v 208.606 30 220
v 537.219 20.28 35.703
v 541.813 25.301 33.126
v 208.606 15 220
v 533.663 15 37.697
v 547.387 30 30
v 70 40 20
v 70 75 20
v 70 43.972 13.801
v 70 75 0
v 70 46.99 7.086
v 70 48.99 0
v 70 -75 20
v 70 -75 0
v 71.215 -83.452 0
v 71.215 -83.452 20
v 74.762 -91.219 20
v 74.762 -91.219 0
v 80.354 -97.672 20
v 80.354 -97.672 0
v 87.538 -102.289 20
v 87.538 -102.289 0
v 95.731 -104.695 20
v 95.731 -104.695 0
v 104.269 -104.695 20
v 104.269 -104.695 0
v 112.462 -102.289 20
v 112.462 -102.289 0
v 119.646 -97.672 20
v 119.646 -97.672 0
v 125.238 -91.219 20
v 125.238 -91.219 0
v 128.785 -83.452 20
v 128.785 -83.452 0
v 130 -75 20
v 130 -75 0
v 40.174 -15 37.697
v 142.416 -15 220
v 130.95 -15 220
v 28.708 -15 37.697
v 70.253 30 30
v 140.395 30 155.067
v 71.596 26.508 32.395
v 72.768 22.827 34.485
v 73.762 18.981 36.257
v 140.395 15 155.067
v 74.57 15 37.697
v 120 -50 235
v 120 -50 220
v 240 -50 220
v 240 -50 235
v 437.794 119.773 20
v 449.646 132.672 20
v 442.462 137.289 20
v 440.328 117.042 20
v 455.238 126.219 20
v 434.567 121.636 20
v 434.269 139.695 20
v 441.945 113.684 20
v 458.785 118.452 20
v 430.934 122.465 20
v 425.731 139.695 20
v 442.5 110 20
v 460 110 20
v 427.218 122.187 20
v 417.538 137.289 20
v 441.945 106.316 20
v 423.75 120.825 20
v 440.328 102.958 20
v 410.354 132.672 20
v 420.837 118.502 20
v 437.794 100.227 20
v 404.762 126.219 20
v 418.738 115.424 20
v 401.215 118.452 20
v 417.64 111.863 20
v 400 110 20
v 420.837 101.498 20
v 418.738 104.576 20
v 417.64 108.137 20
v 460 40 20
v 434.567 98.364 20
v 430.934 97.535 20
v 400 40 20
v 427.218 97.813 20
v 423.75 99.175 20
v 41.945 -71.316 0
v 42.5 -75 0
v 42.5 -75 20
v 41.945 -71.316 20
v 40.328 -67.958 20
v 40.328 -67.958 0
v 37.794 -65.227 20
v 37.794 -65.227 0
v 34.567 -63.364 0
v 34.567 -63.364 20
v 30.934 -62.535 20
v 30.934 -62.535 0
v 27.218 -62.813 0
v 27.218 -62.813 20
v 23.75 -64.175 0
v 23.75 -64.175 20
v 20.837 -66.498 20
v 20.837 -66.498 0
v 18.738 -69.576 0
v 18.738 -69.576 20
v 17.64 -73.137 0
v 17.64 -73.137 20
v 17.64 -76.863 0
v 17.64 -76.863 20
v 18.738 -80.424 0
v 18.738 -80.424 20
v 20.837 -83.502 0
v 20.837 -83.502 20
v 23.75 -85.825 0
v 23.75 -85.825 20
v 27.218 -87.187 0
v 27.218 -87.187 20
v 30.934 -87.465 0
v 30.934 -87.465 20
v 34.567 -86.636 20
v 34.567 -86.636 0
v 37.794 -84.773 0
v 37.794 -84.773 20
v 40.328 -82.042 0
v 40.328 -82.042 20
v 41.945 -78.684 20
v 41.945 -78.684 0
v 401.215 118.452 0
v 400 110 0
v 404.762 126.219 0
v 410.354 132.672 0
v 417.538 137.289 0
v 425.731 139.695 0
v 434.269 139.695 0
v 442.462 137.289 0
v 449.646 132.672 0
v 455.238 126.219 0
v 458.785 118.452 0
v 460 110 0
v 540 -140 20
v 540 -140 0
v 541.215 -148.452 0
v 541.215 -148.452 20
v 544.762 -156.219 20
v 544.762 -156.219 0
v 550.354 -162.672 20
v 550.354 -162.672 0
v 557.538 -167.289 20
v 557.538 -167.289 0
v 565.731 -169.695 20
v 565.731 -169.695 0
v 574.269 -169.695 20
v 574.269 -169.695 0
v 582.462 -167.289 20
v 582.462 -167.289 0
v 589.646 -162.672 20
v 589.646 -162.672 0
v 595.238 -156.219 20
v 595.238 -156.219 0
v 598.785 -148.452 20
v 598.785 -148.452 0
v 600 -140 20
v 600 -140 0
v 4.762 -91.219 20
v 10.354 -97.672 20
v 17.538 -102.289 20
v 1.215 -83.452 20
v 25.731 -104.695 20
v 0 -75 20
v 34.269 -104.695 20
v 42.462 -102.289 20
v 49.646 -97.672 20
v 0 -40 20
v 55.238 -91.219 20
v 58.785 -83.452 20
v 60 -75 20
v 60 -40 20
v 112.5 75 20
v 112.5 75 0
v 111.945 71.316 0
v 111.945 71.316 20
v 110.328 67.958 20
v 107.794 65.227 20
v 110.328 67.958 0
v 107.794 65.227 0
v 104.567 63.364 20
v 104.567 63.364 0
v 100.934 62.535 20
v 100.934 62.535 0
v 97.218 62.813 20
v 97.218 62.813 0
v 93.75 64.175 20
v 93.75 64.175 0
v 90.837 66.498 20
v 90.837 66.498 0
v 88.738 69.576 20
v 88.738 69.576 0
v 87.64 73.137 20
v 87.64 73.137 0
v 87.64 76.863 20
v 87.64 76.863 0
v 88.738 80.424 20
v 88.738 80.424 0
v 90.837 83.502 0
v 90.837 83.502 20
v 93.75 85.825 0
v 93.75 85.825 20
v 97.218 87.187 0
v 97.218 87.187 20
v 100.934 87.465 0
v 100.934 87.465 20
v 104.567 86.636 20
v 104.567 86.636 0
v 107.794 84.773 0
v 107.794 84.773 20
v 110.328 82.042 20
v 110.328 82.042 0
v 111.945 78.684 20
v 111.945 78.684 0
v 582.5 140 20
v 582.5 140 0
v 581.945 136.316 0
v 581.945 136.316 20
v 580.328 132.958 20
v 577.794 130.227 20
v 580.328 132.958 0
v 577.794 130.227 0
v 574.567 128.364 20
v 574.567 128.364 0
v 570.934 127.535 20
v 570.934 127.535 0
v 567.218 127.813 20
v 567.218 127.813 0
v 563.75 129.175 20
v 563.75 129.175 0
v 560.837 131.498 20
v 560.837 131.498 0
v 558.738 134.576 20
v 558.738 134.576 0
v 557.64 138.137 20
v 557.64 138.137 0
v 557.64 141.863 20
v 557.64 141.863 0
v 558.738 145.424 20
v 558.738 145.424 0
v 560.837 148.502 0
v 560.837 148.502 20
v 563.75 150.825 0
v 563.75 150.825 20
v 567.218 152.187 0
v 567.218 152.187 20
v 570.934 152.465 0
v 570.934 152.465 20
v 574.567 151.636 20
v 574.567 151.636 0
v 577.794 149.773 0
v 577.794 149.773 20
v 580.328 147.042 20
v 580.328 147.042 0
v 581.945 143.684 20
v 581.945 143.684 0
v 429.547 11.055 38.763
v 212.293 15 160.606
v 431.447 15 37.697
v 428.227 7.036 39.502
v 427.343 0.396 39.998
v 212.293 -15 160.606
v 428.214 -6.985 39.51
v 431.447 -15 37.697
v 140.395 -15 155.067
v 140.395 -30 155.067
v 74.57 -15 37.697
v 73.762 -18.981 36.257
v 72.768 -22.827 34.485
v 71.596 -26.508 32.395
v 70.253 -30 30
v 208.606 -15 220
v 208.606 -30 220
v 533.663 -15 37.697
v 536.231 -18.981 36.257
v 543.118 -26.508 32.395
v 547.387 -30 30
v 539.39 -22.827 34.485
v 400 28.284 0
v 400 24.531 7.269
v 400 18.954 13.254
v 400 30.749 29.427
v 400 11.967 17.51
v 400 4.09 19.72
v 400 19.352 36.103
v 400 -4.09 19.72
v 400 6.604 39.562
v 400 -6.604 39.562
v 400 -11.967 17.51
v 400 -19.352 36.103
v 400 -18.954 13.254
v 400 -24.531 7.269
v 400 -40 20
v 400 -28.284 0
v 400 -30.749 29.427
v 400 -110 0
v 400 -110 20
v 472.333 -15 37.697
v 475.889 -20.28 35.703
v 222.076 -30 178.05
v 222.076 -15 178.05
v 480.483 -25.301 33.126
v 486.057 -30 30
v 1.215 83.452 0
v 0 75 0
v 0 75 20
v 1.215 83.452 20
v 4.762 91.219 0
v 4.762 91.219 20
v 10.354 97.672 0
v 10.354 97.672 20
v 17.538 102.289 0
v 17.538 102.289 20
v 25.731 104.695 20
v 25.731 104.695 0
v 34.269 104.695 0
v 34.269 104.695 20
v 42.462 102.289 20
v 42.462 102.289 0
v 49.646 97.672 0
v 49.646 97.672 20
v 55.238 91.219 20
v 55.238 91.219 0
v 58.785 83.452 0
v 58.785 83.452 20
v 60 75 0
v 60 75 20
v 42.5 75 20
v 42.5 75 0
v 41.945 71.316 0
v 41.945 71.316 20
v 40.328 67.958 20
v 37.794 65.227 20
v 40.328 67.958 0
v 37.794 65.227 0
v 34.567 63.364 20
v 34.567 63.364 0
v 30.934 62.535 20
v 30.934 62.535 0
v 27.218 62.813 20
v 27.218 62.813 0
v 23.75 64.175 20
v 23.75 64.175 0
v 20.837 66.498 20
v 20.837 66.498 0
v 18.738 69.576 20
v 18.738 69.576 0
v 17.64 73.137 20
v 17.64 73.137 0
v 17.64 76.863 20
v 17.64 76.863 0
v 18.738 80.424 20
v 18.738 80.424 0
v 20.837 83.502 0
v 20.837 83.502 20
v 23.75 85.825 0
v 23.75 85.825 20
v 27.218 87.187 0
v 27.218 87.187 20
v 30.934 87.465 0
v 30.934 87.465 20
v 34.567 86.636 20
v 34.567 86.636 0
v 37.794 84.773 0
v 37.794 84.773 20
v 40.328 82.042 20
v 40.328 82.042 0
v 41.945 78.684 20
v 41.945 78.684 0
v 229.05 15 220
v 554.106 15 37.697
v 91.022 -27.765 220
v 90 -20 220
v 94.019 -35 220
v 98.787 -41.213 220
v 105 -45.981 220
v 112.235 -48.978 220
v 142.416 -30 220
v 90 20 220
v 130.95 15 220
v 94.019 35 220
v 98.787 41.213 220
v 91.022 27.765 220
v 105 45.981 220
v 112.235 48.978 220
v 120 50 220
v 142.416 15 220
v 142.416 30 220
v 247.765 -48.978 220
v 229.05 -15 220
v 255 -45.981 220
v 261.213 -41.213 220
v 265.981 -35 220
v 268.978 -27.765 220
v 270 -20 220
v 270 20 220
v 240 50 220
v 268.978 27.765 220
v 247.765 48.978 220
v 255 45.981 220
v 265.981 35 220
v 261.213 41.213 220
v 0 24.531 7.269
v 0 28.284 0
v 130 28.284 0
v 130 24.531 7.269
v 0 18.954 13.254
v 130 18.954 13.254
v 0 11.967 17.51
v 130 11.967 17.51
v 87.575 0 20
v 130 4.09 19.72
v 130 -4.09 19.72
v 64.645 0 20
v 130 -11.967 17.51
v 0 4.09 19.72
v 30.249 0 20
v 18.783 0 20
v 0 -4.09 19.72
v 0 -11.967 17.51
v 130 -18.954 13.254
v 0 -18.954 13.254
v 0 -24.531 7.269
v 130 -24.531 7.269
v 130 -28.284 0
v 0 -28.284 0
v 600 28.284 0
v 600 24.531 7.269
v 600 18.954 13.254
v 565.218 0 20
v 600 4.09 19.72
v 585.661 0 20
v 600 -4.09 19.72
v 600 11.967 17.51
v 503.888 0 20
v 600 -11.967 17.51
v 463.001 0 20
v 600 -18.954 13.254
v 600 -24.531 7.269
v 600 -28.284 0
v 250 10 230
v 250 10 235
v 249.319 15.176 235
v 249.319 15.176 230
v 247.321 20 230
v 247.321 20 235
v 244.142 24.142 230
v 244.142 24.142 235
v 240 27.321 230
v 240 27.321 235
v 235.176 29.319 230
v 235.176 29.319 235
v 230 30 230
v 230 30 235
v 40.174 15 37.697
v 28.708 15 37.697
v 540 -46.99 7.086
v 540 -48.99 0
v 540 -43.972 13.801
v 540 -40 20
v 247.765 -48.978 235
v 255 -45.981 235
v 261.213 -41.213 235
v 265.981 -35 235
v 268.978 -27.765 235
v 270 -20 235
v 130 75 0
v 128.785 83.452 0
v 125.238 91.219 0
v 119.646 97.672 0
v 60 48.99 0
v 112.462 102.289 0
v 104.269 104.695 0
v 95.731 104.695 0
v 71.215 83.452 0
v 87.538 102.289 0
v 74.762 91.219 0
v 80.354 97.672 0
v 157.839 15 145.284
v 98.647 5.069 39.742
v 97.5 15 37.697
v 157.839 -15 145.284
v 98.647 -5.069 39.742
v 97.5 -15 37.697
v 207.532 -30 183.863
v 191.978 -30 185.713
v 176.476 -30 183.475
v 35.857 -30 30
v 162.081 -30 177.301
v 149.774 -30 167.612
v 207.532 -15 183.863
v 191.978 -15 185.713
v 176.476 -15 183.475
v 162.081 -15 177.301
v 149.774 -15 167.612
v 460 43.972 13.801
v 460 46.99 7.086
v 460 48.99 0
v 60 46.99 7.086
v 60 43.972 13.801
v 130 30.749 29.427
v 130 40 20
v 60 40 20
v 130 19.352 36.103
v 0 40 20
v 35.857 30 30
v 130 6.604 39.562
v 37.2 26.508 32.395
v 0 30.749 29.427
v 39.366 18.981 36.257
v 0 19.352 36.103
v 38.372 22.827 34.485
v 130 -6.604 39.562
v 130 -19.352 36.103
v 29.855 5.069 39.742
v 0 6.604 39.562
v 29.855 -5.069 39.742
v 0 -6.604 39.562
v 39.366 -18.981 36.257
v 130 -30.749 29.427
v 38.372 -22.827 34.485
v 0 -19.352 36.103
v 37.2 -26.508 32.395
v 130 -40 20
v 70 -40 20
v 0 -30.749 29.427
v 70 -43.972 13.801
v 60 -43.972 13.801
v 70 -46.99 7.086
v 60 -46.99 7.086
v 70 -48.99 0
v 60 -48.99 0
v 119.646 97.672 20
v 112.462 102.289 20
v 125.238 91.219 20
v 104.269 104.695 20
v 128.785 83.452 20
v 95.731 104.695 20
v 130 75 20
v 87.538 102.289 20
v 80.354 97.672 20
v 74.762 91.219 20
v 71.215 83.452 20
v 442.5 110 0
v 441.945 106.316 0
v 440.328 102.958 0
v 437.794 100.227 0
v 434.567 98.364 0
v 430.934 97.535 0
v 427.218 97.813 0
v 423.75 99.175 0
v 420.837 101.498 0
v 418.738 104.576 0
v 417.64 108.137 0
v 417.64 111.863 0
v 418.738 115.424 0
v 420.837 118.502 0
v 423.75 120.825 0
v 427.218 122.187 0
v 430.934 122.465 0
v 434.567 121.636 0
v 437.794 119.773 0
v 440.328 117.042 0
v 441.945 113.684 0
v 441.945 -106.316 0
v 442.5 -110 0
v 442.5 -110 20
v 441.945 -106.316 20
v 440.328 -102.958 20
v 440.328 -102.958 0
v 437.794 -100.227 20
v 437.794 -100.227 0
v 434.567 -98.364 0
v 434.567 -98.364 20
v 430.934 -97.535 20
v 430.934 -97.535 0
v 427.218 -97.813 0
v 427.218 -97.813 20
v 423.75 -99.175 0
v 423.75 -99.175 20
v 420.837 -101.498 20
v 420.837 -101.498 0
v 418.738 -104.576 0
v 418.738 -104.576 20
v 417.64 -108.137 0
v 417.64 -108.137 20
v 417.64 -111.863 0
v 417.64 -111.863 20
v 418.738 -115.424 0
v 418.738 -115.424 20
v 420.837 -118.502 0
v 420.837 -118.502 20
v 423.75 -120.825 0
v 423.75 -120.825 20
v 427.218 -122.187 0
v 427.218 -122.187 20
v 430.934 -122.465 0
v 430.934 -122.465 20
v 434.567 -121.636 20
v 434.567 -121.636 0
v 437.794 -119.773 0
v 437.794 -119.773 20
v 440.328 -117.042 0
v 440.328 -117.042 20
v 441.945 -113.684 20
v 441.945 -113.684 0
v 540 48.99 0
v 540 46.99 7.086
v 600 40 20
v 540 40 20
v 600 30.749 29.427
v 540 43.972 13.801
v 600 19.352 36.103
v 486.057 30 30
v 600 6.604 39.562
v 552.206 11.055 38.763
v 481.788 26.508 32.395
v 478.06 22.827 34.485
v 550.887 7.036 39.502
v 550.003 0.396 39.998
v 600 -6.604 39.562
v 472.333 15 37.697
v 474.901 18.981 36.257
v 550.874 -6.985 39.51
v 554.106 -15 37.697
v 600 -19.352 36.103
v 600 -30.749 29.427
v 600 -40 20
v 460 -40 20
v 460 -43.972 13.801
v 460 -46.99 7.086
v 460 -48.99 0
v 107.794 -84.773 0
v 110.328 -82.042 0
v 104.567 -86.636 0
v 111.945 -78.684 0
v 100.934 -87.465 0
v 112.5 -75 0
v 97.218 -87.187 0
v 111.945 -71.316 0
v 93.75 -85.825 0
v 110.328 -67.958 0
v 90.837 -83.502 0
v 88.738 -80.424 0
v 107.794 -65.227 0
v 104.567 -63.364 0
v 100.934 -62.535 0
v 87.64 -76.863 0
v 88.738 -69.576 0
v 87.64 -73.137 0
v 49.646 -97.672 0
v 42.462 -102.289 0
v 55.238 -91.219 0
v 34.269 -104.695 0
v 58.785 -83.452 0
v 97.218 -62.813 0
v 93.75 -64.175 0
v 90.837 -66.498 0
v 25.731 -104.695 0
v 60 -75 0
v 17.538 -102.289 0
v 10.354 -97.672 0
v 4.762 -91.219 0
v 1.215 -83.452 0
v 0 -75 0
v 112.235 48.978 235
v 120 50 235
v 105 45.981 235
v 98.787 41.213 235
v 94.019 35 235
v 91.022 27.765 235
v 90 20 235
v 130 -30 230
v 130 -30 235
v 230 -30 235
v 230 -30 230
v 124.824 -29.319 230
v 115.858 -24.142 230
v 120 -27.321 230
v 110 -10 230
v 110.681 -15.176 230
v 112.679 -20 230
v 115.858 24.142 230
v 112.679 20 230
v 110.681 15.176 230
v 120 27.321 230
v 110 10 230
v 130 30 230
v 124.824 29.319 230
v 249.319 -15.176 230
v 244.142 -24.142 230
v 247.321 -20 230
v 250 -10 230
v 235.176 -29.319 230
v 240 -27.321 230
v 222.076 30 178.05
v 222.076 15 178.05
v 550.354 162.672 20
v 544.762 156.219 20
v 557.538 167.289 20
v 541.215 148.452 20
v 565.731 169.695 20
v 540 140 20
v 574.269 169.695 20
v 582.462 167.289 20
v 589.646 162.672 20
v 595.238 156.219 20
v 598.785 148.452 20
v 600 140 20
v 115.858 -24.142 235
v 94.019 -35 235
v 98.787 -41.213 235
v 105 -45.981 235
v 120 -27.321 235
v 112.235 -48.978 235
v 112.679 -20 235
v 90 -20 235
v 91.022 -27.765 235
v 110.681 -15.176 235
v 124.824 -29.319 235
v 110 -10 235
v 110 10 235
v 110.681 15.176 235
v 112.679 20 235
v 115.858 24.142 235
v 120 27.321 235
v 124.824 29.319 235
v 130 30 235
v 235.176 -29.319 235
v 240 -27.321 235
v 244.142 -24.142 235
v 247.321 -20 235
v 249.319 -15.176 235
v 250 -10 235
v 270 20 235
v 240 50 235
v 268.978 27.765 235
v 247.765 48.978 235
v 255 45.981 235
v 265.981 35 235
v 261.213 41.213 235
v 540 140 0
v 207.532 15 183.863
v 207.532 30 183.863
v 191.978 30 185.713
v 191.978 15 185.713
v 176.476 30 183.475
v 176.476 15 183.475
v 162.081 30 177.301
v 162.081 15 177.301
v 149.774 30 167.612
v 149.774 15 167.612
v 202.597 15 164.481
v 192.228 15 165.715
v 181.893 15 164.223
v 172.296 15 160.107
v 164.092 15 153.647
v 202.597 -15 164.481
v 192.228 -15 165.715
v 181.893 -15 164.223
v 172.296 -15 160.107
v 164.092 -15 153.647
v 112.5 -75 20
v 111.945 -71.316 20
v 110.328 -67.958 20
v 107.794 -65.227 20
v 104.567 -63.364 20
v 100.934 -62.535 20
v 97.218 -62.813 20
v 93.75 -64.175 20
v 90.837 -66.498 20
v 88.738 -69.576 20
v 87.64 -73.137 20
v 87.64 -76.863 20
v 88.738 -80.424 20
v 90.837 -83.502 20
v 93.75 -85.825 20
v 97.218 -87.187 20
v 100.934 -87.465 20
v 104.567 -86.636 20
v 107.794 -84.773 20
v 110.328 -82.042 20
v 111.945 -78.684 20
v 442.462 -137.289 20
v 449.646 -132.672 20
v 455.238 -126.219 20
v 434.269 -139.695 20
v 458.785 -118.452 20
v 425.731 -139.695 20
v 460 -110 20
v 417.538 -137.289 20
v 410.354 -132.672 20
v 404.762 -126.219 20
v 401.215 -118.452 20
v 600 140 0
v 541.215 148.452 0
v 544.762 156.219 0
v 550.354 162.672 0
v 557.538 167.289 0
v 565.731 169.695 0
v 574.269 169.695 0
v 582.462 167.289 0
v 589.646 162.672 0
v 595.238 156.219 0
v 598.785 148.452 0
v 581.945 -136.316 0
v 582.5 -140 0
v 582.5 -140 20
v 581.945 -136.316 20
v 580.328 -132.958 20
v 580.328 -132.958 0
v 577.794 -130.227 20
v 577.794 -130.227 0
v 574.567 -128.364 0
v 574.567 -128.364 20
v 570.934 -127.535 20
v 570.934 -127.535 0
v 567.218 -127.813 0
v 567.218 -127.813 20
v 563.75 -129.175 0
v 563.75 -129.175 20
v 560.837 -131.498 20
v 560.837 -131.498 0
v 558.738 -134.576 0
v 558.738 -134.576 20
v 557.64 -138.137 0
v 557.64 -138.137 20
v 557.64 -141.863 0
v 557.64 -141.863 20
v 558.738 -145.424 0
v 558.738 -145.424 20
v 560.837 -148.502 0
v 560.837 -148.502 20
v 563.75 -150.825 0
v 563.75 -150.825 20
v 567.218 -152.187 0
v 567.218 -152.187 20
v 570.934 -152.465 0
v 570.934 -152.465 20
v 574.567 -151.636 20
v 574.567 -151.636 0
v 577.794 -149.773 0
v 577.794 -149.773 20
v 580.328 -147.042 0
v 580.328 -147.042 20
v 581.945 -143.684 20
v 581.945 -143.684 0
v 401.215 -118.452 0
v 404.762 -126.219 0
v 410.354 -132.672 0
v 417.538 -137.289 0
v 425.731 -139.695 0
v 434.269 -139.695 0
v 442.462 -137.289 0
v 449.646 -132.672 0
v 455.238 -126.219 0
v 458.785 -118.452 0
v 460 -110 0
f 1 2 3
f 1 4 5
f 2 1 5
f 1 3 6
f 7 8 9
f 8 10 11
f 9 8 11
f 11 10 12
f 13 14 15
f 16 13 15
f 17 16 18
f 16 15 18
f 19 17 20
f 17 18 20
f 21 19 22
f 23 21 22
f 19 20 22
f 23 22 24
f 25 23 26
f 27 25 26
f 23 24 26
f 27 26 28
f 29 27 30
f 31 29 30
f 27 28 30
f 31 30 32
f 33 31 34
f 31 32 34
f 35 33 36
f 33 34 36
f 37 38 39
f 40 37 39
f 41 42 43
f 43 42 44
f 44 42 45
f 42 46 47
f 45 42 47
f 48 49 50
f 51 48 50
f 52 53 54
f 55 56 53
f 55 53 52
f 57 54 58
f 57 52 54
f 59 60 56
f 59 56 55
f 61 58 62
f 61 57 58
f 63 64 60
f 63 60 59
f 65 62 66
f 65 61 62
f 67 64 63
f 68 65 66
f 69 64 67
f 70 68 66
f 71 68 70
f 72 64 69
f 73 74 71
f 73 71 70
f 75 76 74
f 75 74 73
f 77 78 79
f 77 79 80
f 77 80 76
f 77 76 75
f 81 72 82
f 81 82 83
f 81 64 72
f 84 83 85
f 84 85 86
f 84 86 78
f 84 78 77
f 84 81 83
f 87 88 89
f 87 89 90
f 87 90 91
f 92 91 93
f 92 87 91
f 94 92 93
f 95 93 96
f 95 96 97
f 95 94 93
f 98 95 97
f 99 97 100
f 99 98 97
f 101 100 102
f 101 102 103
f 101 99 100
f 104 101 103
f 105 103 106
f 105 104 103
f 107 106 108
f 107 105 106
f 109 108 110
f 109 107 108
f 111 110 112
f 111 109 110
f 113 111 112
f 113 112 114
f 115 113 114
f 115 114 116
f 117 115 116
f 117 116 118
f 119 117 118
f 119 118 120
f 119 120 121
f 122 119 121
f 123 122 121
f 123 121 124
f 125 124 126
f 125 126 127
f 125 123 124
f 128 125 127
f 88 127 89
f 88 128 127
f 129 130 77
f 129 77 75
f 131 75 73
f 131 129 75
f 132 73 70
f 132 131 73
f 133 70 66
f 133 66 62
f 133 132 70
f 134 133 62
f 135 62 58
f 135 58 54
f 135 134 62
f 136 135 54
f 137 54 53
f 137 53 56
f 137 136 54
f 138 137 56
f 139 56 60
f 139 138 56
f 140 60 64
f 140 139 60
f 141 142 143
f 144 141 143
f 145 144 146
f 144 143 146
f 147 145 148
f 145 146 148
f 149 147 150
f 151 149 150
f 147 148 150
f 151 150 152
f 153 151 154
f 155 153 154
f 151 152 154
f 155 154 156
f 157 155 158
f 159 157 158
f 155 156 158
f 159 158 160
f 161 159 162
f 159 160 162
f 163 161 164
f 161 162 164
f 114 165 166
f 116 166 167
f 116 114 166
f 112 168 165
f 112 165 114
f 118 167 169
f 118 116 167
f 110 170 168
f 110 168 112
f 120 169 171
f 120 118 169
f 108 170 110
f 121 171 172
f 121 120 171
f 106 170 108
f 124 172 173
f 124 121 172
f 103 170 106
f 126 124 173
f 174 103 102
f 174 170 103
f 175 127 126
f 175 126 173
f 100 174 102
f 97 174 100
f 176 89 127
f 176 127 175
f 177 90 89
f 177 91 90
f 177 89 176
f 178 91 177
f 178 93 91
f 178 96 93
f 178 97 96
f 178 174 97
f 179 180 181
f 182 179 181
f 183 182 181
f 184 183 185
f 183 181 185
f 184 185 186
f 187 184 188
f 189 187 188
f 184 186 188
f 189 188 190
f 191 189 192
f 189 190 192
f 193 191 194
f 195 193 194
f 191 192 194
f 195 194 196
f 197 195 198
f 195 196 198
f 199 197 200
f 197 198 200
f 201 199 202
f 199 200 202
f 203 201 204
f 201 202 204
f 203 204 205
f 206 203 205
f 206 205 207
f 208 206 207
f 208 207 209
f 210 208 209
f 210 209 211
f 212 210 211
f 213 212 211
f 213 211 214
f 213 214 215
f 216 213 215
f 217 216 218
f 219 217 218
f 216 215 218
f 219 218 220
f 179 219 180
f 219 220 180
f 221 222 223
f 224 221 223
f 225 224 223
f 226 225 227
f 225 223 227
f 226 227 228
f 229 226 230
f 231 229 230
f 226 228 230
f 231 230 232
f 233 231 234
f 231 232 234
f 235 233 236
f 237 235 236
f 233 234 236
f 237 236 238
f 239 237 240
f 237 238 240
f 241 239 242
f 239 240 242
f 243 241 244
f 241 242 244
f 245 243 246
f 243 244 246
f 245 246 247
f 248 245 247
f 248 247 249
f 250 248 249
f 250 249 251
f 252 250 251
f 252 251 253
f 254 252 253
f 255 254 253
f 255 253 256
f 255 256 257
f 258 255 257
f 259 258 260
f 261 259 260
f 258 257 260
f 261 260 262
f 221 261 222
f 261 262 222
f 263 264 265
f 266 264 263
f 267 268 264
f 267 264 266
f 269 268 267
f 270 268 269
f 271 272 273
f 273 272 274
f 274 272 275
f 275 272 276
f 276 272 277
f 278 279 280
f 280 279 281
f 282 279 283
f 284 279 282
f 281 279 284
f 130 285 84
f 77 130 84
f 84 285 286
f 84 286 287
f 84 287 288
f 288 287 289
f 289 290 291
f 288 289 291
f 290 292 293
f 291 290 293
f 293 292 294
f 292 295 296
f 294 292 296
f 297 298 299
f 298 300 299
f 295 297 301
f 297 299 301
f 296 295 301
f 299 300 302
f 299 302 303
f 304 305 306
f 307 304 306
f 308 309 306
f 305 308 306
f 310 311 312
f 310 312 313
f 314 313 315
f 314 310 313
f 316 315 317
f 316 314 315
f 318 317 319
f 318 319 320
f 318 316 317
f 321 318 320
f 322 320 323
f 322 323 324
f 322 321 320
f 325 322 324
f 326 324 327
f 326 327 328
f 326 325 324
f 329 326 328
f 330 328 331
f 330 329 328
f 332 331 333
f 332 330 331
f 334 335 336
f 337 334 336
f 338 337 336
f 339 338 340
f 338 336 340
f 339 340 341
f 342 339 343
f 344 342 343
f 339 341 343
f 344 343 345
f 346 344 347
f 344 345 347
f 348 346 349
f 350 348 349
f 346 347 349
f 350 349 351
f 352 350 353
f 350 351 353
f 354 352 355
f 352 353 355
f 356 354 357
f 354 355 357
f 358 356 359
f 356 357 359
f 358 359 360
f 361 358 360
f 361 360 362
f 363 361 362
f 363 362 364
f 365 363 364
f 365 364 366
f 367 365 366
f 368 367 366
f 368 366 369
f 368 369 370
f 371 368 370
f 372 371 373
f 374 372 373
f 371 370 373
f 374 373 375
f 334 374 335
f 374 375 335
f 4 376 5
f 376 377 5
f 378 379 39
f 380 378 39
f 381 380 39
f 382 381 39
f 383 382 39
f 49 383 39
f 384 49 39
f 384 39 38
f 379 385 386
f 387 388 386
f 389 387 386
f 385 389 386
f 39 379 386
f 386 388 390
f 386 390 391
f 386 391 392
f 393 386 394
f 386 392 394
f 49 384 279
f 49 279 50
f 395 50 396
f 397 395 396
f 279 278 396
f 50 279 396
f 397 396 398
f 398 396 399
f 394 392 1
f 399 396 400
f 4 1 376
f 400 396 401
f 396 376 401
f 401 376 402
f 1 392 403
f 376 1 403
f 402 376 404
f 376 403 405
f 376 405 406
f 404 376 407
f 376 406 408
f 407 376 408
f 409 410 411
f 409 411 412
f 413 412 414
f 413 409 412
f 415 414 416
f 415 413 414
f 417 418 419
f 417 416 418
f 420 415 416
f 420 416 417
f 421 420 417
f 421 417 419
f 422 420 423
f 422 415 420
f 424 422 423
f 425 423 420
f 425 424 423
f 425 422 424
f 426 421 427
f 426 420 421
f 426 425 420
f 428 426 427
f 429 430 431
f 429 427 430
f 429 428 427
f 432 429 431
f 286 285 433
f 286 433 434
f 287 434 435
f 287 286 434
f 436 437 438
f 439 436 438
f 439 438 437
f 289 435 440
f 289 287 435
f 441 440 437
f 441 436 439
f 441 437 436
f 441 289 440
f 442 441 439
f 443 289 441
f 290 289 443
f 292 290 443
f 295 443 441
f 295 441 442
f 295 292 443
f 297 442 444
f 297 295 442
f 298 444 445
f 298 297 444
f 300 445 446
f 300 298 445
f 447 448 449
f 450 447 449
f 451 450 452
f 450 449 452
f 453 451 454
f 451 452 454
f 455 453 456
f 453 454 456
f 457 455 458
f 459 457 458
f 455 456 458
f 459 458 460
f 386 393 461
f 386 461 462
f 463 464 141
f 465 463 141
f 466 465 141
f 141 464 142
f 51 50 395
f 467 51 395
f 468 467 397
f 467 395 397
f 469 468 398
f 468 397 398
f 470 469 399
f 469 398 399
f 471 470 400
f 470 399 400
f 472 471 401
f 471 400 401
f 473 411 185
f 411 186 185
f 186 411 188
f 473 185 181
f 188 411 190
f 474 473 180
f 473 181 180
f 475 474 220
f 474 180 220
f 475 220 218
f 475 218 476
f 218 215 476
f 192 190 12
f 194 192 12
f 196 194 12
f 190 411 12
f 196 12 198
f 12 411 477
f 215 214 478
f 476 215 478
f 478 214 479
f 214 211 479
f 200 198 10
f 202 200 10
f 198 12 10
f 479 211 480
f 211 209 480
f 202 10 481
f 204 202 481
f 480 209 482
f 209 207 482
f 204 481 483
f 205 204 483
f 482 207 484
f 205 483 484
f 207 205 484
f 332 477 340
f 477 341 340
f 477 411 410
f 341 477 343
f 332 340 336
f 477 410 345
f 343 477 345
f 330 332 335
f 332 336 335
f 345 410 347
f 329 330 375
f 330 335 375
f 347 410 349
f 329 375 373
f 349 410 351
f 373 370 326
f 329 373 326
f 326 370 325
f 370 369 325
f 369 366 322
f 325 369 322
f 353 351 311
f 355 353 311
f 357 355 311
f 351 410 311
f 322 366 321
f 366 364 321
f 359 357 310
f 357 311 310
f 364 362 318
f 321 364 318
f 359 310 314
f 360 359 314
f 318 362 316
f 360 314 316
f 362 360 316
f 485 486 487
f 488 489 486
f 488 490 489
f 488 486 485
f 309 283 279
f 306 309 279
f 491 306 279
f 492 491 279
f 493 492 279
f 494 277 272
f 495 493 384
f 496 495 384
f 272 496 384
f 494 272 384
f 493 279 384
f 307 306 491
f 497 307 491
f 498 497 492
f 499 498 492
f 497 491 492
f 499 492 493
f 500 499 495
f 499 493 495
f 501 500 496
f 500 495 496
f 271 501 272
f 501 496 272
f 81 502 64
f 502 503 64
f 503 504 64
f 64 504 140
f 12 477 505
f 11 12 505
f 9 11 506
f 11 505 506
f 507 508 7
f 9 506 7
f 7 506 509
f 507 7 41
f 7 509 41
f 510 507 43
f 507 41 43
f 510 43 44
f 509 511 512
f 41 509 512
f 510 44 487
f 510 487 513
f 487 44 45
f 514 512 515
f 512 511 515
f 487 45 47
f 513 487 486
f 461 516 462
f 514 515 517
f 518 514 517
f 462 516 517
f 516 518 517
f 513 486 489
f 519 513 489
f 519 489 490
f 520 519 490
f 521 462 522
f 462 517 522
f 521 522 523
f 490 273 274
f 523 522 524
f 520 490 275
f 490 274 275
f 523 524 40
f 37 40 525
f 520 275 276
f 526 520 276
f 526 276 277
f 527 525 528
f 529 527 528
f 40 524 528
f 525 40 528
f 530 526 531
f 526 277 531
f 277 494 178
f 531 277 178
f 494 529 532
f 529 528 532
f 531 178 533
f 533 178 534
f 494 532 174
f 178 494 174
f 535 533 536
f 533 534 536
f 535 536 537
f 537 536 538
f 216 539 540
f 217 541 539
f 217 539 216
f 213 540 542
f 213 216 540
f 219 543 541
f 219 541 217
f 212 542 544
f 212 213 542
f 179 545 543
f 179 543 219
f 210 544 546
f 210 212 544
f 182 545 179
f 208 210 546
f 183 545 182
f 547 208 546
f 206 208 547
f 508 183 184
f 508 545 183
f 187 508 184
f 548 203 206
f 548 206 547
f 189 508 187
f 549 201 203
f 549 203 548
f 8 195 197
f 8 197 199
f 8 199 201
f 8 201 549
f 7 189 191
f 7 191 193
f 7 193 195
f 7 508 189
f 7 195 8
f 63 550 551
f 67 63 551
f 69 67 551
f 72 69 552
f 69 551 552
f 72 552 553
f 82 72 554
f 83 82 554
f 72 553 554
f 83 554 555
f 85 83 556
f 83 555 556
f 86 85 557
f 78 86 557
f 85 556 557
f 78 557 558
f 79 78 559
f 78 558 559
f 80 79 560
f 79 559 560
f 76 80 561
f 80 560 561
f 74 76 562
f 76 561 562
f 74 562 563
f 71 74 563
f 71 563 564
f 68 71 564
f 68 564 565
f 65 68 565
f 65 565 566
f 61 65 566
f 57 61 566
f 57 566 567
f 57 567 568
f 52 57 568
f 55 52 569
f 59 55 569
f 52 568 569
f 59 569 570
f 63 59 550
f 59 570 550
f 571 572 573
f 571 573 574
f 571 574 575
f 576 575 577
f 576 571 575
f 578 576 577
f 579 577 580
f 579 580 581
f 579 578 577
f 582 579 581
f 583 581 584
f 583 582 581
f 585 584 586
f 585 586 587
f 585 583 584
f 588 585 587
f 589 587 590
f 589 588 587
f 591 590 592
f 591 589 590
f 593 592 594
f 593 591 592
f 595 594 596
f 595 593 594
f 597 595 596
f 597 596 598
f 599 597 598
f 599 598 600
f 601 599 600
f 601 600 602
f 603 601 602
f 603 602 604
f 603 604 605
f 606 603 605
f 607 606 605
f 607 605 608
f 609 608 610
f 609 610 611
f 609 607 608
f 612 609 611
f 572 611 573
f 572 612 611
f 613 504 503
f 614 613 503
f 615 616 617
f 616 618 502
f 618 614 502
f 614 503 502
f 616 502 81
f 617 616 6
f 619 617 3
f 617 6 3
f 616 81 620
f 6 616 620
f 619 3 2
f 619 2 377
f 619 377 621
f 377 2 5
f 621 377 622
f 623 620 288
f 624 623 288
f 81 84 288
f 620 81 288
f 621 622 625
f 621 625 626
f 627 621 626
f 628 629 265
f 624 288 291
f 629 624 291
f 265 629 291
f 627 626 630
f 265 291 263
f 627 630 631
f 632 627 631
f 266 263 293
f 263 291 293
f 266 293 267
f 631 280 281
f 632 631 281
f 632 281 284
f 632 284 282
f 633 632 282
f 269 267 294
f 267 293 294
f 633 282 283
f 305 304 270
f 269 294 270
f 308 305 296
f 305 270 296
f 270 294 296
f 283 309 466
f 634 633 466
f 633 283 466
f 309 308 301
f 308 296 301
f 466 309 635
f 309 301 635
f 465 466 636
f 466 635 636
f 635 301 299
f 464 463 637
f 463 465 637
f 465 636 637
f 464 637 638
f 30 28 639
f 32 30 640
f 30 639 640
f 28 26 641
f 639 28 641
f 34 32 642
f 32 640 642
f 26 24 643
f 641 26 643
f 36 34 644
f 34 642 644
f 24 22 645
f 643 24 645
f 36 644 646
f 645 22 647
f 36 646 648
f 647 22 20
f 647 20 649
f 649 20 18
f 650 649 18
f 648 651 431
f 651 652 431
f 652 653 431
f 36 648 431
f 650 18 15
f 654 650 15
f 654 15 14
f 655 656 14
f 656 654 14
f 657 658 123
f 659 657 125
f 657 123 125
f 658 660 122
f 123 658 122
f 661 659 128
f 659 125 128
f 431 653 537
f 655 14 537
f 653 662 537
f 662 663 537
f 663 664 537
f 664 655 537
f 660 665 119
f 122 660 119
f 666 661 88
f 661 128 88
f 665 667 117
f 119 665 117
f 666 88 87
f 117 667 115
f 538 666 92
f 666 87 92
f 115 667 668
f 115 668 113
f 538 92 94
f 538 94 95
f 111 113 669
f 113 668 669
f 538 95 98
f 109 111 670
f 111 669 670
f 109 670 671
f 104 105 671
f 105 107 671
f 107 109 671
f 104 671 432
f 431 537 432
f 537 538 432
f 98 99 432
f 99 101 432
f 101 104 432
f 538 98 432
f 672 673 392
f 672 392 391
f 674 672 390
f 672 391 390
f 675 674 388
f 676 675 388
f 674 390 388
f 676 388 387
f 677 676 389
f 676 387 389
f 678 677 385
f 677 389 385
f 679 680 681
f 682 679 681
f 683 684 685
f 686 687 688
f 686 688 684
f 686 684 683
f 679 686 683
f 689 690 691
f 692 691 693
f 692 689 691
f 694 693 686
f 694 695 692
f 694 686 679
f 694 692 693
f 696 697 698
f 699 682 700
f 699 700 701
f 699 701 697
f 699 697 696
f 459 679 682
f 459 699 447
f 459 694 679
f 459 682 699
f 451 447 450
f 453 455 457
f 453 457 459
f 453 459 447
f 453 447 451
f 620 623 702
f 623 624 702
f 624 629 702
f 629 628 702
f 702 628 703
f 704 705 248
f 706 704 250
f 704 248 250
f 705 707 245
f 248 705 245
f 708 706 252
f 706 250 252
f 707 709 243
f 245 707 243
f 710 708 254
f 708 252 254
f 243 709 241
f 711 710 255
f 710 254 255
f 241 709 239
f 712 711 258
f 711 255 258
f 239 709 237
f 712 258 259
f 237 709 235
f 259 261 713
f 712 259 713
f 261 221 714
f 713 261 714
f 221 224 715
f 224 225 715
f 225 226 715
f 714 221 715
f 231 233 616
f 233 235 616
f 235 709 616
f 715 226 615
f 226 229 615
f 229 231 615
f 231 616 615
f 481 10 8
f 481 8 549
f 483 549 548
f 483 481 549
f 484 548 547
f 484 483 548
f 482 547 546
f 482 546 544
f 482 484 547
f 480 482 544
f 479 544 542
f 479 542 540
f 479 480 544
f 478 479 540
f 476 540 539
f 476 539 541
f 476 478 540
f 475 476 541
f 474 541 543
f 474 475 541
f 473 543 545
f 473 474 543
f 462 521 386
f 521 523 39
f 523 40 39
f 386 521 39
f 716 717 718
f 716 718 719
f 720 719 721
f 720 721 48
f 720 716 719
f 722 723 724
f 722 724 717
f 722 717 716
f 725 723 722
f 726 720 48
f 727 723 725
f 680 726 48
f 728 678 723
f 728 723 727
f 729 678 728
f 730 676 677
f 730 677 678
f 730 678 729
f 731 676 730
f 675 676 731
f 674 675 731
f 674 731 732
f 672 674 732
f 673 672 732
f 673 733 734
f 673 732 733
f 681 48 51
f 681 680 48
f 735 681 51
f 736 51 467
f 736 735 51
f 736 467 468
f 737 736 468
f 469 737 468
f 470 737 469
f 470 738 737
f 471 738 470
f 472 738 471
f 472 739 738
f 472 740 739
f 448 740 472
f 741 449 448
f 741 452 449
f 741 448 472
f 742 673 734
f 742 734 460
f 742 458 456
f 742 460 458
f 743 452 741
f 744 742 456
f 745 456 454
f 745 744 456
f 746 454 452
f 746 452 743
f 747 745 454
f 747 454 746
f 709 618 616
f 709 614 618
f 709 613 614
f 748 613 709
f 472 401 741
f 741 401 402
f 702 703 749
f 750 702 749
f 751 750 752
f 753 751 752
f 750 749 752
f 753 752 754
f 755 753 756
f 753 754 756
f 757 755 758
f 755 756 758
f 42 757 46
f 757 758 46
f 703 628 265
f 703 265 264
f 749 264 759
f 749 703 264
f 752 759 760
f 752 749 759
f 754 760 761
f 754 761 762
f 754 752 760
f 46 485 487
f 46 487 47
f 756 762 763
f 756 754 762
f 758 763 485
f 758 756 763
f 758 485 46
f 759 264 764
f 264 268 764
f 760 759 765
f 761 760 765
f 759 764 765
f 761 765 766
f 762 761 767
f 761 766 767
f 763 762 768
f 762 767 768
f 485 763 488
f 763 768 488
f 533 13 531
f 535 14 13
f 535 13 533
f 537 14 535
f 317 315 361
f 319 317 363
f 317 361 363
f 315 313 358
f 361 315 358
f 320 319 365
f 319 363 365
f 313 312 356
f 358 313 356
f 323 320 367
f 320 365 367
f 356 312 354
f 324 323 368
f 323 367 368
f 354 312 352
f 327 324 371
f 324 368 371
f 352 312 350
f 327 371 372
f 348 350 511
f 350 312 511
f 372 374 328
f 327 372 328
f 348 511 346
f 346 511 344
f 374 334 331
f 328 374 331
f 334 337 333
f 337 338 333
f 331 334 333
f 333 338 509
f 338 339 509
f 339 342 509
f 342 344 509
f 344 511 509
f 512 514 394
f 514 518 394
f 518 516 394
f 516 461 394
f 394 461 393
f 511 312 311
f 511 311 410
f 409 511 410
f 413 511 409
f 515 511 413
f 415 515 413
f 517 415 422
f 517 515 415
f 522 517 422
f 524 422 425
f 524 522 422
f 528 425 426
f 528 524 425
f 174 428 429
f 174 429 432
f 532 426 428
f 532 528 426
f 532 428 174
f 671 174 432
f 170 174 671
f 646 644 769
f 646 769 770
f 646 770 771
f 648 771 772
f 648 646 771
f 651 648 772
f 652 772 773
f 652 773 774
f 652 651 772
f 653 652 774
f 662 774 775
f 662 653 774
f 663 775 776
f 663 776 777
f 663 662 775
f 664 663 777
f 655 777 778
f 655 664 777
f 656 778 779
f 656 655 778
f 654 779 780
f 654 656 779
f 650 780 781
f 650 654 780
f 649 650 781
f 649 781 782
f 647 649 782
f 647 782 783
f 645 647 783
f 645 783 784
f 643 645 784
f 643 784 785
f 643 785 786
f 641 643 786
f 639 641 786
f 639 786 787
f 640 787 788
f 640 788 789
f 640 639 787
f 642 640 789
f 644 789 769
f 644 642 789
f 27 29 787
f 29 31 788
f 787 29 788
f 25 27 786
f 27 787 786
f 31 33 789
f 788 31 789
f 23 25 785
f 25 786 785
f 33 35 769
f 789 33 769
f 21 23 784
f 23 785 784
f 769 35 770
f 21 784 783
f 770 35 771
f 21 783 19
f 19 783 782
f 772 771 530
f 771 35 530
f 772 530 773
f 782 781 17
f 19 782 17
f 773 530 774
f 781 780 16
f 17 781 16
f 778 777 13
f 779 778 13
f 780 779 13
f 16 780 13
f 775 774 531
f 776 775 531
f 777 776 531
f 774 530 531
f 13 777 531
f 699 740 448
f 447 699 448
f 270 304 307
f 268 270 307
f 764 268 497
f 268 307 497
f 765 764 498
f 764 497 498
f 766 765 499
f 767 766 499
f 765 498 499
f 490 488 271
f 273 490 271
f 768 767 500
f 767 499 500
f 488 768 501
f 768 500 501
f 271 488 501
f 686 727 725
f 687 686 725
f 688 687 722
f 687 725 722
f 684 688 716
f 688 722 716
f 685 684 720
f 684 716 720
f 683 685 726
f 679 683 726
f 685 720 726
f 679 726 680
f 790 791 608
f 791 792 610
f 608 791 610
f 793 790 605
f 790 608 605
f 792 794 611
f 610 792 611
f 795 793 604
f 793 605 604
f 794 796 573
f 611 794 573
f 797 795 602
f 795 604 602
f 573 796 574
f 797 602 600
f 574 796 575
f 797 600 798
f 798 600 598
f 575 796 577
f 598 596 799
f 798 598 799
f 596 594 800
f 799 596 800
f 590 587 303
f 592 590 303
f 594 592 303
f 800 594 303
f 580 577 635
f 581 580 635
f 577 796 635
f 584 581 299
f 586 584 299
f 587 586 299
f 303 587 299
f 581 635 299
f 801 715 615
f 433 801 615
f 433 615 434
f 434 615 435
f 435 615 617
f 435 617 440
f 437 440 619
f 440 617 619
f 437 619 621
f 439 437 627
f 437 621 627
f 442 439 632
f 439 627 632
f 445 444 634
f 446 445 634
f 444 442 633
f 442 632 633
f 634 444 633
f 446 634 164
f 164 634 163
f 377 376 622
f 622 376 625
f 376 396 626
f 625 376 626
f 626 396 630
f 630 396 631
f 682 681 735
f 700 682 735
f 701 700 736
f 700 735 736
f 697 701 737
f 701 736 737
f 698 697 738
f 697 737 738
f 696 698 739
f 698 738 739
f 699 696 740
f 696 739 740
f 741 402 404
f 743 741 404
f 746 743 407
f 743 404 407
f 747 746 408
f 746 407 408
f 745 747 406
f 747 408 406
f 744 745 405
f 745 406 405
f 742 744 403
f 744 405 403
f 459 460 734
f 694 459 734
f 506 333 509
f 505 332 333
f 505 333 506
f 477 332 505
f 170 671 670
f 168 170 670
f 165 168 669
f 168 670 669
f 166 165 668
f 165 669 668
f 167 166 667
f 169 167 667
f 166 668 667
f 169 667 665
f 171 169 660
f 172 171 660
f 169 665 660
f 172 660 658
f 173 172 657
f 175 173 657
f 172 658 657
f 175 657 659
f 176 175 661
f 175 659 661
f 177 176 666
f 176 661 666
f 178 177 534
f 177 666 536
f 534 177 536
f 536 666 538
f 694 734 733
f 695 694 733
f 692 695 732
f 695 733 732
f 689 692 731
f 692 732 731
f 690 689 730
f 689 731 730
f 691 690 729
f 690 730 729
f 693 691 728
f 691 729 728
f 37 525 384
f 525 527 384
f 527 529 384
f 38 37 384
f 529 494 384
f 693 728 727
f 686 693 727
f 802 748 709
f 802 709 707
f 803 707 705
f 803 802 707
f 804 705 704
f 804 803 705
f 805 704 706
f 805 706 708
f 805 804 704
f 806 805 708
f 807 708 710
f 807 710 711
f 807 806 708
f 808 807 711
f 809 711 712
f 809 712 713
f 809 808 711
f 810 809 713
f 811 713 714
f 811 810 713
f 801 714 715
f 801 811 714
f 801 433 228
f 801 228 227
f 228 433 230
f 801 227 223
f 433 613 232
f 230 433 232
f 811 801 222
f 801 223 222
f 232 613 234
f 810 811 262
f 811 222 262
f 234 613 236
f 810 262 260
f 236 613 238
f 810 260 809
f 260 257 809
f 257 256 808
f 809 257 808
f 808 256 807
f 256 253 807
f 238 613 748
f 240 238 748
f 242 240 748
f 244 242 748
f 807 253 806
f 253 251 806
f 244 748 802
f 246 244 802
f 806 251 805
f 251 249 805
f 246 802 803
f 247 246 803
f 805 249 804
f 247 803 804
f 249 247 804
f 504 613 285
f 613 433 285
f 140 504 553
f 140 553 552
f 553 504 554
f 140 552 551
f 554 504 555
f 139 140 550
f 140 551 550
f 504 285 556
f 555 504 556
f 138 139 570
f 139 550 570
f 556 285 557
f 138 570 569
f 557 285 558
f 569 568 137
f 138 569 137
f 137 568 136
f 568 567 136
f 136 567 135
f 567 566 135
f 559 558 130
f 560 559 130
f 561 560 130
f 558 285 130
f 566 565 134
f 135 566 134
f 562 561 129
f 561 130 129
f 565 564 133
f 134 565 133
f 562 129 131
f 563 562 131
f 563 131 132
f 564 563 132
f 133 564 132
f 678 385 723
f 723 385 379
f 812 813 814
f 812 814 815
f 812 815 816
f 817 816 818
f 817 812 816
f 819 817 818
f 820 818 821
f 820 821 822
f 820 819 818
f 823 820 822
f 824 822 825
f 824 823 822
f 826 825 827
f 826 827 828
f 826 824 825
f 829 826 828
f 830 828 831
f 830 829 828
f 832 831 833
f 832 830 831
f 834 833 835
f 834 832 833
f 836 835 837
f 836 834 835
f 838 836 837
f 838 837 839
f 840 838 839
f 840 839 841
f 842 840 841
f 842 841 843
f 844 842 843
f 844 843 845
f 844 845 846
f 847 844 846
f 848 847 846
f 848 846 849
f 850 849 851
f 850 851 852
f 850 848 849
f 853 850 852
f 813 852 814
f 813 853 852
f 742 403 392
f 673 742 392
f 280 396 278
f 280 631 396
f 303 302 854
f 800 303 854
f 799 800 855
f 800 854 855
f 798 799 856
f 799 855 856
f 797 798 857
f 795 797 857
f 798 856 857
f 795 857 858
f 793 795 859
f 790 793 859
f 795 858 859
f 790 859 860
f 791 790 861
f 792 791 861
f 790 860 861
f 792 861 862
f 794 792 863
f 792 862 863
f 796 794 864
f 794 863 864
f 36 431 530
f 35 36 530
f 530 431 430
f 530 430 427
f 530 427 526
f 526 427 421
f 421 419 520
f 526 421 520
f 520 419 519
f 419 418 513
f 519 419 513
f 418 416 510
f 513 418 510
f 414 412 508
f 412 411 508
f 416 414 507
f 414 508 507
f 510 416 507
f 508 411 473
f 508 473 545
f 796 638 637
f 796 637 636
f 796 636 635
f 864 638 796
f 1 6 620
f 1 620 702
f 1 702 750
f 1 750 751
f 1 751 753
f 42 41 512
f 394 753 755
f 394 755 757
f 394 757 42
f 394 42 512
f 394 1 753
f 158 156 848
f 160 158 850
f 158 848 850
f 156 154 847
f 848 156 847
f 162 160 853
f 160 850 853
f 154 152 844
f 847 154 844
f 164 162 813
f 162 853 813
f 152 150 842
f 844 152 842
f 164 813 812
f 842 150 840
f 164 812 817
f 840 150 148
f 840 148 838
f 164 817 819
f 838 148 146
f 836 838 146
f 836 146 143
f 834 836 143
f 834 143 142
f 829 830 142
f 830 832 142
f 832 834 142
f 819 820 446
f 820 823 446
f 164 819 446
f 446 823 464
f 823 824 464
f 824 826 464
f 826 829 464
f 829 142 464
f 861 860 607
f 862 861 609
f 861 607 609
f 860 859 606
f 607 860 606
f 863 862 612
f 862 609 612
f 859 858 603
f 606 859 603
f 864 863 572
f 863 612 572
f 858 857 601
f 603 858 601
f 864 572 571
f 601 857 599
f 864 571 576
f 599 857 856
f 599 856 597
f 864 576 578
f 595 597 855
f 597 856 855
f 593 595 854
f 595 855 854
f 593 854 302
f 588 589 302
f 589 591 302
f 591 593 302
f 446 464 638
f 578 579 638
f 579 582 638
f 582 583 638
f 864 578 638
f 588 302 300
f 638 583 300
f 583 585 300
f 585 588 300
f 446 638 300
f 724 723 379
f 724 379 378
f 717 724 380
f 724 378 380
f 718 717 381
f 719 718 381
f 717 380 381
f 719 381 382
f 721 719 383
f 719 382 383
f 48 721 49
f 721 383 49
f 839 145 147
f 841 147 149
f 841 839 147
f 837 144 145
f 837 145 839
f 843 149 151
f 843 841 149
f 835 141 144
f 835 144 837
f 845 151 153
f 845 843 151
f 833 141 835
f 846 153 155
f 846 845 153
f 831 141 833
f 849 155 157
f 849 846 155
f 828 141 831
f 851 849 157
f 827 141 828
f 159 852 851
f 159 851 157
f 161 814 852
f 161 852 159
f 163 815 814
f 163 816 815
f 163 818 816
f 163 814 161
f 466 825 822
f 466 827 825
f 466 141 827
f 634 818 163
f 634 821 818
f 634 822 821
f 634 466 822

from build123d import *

# Parameters (mm, degrees)
PAD_DEPTH         = 600
PAD001_DEPTH      = 15
PAD002_DEPTH      = 30
SKETCH004_W       = 270
SKETCH004_H       = 40
POCKET_DEPTH      = 48.990795
POCKET_DEPTH_BACK = -48.990795
PAD003_DEPTH      = 15
POCKET001_DEPTH   = 5
SKETCH007_R       = 12.5
PAD004_DEPTH      = 20


with BuildPart() as part:
    # Sketch (on YZ_Plane of Origin) → Pad (new body)
    with BuildSketch(Plane.YZ):
        with BuildLine():
            ThreePointArc((28.284271, 0), (0, 20), (-28.284271, 0))
            Line((-48.989795, 0), (-28.284271, 0))
            ThreePointArc((48.989795, 0), (0, 40), (-48.989795, 0))
            Line((28.284271, 0), (48.989795, 0))
        make_face()
    extrude(amount=PAD_DEPTH)

    # Sketch002 (on XZ_Plane of Origin) → Pad001 (join, symmetric)
    with BuildSketch(Plane.XZ):
        with BuildLine():
            Line((18.783308, 20), (130.950231, 220))
            Line((130.950231, 220), (229.049769, 220))
            Line((229.049769, 220), (585.661137, 20))
            Line((463.001241, 20), (585.661137, 20))
            Line((212.293102, 160.605803), (463.001241, 20))
            ThreePointArc((212.293102, 160.605803), (181.892852, 164.222858), (157.838985, 145.28428))
            Line((87.575223, 20), (157.838985, 145.28428))
            Line((18.783308, 20), (87.575223, 20))
        make_face()
    extrude(amount=PAD001_DEPTH, both=True)

    # Sketch003 → Pad002 (join, symmetric)
    with BuildSketch(Plane.XZ):
        with BuildLine():
            Line((30.248627, 20), (142.41555, 220))
            Line((142.41555, 220), (208.606453, 220))
            Line((208.606453, 220), (565.217821, 20))
            Line((565.217821, 20), (503.887873, 20))
            Line((503.887873, 20), (222.076251, 178.049713))
            ThreePointArc((222.076251, 178.049713), (176.475876, 183.475296), (140.395074, 155.067429))
            Line((140.395074, 155.067429), (64.644585, 20))
            Line((64.644585, 20), (30.248627, 20))
        make_face()
    pad002 = extrude(amount=PAD002_DEPTH, both=True)

    # Mirrored: Pad002 across XZ
    add(pad002.mirror(Plane.XZ))

    # Sketch004 (on XZ_Plane of Origin) → Pocket (cut, two sides)
    with BuildSketch(Plane.XZ) as pocket_sk:
        with Locations((265, 20)):
            Rectangle(SKETCH004_W, SKETCH004_H)
    extrude(amount=-POCKET_DEPTH, mode=Mode.SUBTRACT)
    extrude(pocket_sk.sketch, amount=-POCKET_DEPTH_BACK, mode=Mode.SUBTRACT)

    # Sketch005 (on Face27 of Pocket) → Pad003 (join)
    with BuildSketch(Plane.XY.offset(220)):
        with BuildLine():
            Line((90, 20), (90, -20))
            ThreePointArc((90, -20), (98.786797, -41.213203), (120, -50))
            Line((120, -50), (240, -50))
            ThreePointArc((240, -50), (261.213203, -41.213203), (270, -20))
            Line((270, -20), (270, 20))
            ThreePointArc((270, 20), (261.213203, 41.213203), (240, 50))
            Line((240, 50), (120, 50))
            ThreePointArc((120, 50), (98.786797, 41.213203), (90, 20))
        make_face()
    extrude(amount=PAD003_DEPTH)

    # Sketch006 (on Face45 of Pad003) → Pocket001 (cut)
    with BuildSketch(Plane.XY.offset(235)):
        with BuildLine():
            Line((110, 10), (110, -10))
            ThreePointArc((110, -10), (115.857864, -24.142136), (130, -30))
            Line((130, -30), (230, -30))
            ThreePointArc((230, -30), (244.142136, -24.142136), (250, -10))
            Line((250, -10), (250, 10))
            ThreePointArc((250, 10), (244.142136, 24.142136), (230, 30))
            Line((230, 30), (130, 30))
            ThreePointArc((130, 30), (115.857864, 24.142136), (110, 10))
        make_face()
    extrude(amount=-POCKET001_DEPTH, mode=Mode.SUBTRACT)

    # Sketch007 (on XY_Plane of Origin) → Pad004 (join)
    with BuildSketch(Plane.XY):
        with BuildLine():
            Line((0, -28.284271), (0, -75))
            ThreePointArc((0, -75), (30, -105), (60, -75))
            Line((60, -75), (60, -28.284271))
            Line((60, -28.284271), (0, -28.284271))
        make_face()
        with Locations((30, -75)):
            Circle(SKETCH007_R, mode=Mode.SUBTRACT)
        with BuildLine():
            Line((130, -28.284271), (130, -75))
            ThreePointArc((70, -75), (100, -105), (130, -75))
            Line((70, -75), (70, -28.284271))
            Line((70, -28.284271), (130, -28.284271))
        make_face()
        with Locations((100, -75)):
            Circle(SKETCH007_R, mode=Mode.SUBTRACT)
        with BuildLine():
            Line((400, -28.284271), (460, -28.284271))
            Line((460, -28.284271), (460, -110))
            ThreePointArc((400, -110), (430, -140), (460, -110))
            Line((400, -110), (400, -28.284271))
        make_face()
        with Locations((430, -110)):
            Circle(SKETCH007_R, mode=Mode.SUBTRACT)
        with BuildLine():
            Line((540, -28.284271), (540, -140))
            ThreePointArc((540, -140), (570, -170), (600, -140))
            Line((600, -140), (600, -28.284271))
            Line((600, -28.284271), (540, -28.284271))
        make_face()
        with Locations((570, -140)):
            Circle(SKETCH007_R, mode=Mode.SUBTRACT)
    pad004 = extrude(amount=PAD004_DEPTH)

    # Mirrored001: Pad004 across XZ
    add(pad004.mirror(Plane.XZ))


solid = part.part
